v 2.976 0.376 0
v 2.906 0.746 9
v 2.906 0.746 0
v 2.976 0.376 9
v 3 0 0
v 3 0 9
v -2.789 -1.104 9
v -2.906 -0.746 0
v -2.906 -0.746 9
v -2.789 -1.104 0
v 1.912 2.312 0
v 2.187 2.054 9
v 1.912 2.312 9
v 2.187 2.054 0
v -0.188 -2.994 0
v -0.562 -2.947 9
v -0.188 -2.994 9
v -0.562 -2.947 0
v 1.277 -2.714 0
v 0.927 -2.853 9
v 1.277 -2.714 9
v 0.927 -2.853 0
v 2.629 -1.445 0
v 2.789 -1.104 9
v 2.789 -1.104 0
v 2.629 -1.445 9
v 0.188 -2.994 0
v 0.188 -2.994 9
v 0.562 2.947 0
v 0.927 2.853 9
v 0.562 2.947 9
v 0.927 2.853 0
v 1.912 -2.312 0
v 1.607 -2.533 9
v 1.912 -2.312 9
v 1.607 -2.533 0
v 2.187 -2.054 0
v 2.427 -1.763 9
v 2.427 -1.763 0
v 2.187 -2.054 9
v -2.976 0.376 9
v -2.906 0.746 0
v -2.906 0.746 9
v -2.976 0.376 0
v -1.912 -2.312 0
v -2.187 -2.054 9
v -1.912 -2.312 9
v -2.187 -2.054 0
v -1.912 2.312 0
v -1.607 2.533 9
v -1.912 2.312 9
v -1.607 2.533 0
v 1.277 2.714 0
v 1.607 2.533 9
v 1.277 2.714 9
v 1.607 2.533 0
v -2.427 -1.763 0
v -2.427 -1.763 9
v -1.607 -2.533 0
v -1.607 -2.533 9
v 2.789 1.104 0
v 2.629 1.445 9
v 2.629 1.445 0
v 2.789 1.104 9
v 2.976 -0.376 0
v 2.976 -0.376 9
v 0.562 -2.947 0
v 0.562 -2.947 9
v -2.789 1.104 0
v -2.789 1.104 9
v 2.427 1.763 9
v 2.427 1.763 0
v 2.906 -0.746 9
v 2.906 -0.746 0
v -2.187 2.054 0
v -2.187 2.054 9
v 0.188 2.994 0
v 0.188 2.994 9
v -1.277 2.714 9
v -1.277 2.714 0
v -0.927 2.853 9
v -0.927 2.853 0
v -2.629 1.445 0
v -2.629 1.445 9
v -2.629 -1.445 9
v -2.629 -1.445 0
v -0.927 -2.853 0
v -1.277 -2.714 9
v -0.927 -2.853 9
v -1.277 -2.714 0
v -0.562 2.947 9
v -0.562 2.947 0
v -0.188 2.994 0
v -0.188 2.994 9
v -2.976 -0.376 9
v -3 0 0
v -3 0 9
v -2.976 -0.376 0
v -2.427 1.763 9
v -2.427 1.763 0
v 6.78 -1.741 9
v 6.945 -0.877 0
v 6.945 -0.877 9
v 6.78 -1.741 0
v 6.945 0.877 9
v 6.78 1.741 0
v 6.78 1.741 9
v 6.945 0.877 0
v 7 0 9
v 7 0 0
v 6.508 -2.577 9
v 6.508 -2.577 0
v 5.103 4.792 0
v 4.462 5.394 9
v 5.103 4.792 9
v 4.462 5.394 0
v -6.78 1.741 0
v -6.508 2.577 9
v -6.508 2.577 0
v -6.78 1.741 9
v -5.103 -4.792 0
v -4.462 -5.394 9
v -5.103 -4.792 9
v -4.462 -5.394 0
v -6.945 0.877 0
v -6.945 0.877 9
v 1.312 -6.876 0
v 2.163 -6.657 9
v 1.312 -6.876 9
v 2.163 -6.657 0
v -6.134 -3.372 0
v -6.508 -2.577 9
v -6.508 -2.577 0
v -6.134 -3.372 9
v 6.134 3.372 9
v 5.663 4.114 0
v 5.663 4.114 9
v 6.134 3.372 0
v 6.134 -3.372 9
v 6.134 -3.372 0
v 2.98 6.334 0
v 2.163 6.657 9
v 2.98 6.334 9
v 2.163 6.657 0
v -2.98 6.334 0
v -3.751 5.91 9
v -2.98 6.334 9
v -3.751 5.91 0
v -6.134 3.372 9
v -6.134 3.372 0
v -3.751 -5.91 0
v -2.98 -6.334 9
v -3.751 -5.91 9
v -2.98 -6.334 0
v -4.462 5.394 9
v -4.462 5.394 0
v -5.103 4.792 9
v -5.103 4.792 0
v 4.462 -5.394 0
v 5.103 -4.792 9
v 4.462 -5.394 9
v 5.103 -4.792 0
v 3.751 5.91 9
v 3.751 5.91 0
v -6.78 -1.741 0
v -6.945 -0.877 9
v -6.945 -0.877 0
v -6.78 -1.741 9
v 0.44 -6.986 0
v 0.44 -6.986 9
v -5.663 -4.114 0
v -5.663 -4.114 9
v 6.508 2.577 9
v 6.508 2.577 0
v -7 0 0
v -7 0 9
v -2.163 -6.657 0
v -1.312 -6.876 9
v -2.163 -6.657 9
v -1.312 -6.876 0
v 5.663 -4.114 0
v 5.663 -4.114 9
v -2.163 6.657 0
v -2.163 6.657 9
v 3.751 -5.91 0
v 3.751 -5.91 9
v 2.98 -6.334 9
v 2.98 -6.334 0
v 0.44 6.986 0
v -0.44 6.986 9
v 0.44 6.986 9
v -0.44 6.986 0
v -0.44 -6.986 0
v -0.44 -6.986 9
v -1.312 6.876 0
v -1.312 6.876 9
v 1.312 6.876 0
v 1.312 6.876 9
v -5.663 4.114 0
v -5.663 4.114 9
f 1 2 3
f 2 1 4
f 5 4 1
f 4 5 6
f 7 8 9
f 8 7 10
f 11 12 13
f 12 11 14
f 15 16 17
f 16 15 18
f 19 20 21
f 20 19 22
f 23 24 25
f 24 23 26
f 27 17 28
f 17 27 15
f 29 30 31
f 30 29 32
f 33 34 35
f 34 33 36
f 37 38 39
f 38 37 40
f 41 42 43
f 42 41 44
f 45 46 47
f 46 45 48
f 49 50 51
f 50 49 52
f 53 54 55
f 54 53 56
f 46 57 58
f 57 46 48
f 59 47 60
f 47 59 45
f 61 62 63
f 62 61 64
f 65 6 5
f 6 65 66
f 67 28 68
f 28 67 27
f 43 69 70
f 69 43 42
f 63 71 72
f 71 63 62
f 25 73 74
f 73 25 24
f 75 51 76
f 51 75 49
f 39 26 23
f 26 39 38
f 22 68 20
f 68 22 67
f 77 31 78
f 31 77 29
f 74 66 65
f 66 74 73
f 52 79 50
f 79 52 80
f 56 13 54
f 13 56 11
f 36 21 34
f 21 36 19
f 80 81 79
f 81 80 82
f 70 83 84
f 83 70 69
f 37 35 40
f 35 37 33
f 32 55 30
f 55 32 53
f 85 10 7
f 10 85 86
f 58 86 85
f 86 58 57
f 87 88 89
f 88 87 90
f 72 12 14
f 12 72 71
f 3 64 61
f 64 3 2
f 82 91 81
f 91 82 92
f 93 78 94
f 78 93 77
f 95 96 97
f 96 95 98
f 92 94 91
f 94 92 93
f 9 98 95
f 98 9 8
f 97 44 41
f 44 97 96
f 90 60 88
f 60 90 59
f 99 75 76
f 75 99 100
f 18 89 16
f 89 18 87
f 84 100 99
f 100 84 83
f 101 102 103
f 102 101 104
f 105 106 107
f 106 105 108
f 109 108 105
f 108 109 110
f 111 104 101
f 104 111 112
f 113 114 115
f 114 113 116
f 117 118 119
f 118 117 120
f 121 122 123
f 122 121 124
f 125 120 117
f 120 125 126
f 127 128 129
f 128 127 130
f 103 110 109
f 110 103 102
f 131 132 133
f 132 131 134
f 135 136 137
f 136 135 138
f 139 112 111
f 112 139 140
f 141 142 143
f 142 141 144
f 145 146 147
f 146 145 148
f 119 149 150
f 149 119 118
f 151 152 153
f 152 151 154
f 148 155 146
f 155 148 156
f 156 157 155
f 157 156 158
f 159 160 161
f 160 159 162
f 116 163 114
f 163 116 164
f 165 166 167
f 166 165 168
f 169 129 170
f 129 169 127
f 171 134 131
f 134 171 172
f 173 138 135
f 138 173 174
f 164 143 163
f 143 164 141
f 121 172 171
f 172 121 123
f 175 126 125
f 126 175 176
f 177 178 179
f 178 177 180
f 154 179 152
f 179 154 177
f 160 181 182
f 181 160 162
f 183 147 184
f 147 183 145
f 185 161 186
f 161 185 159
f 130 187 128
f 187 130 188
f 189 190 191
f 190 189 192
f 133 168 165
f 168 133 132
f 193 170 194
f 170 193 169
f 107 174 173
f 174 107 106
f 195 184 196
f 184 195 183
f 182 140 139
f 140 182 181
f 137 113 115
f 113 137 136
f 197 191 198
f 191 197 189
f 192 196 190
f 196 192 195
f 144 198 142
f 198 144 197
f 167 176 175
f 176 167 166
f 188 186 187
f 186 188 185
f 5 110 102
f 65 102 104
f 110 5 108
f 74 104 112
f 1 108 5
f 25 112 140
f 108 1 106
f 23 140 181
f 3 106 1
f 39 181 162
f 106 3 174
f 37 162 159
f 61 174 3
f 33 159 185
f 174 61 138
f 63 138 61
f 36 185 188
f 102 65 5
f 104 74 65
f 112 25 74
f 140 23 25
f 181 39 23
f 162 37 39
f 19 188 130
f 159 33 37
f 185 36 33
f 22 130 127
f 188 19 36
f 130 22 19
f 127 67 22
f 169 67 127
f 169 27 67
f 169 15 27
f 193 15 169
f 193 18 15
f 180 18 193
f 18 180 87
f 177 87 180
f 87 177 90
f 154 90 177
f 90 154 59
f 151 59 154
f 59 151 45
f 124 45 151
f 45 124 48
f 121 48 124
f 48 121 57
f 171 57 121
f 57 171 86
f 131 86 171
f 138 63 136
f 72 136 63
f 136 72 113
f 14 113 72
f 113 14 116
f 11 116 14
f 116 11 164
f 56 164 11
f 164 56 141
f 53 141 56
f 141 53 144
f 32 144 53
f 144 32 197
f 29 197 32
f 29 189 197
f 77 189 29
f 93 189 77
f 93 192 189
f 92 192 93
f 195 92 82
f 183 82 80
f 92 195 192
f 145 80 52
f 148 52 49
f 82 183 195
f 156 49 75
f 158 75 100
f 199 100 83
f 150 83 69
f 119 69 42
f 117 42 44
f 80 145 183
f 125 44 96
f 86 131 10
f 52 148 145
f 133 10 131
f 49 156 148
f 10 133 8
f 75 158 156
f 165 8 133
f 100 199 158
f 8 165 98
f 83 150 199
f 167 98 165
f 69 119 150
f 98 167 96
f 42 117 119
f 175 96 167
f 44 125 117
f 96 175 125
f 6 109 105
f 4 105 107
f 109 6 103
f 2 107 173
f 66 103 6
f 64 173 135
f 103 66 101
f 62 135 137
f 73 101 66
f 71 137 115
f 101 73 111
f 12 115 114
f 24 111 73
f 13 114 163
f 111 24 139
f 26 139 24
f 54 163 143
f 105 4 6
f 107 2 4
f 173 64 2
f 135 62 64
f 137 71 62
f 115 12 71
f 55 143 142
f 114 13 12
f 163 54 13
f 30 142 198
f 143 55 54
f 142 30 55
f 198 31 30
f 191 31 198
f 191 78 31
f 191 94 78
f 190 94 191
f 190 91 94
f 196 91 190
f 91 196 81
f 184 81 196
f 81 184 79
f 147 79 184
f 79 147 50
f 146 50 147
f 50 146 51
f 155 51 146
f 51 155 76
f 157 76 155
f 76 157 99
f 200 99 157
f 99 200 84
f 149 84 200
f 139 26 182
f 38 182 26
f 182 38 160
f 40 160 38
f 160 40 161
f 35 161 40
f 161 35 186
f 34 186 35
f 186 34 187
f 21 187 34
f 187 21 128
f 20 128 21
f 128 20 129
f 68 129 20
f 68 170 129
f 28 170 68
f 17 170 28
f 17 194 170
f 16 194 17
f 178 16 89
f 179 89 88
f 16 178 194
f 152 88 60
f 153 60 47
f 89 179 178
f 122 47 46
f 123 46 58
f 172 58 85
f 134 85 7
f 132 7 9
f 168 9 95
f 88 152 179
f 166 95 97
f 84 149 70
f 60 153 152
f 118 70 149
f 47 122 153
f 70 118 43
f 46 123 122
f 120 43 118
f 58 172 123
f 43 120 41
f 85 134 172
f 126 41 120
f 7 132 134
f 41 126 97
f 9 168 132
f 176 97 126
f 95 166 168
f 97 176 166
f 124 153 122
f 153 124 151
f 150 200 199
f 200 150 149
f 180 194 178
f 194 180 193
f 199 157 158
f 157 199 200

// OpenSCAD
$fn = 50;

difference() {
	union() {
		cylinder(h = 9, r = 7.0);
	}
	union() {
		translate(v = [0, 0, -100]) {
			cylinder(h = 200, r = 3.0);
		}
		translate(v = [0, 0, -100]) {
			cylinder(h = 200, r = 1.5);
		}
	}
}
